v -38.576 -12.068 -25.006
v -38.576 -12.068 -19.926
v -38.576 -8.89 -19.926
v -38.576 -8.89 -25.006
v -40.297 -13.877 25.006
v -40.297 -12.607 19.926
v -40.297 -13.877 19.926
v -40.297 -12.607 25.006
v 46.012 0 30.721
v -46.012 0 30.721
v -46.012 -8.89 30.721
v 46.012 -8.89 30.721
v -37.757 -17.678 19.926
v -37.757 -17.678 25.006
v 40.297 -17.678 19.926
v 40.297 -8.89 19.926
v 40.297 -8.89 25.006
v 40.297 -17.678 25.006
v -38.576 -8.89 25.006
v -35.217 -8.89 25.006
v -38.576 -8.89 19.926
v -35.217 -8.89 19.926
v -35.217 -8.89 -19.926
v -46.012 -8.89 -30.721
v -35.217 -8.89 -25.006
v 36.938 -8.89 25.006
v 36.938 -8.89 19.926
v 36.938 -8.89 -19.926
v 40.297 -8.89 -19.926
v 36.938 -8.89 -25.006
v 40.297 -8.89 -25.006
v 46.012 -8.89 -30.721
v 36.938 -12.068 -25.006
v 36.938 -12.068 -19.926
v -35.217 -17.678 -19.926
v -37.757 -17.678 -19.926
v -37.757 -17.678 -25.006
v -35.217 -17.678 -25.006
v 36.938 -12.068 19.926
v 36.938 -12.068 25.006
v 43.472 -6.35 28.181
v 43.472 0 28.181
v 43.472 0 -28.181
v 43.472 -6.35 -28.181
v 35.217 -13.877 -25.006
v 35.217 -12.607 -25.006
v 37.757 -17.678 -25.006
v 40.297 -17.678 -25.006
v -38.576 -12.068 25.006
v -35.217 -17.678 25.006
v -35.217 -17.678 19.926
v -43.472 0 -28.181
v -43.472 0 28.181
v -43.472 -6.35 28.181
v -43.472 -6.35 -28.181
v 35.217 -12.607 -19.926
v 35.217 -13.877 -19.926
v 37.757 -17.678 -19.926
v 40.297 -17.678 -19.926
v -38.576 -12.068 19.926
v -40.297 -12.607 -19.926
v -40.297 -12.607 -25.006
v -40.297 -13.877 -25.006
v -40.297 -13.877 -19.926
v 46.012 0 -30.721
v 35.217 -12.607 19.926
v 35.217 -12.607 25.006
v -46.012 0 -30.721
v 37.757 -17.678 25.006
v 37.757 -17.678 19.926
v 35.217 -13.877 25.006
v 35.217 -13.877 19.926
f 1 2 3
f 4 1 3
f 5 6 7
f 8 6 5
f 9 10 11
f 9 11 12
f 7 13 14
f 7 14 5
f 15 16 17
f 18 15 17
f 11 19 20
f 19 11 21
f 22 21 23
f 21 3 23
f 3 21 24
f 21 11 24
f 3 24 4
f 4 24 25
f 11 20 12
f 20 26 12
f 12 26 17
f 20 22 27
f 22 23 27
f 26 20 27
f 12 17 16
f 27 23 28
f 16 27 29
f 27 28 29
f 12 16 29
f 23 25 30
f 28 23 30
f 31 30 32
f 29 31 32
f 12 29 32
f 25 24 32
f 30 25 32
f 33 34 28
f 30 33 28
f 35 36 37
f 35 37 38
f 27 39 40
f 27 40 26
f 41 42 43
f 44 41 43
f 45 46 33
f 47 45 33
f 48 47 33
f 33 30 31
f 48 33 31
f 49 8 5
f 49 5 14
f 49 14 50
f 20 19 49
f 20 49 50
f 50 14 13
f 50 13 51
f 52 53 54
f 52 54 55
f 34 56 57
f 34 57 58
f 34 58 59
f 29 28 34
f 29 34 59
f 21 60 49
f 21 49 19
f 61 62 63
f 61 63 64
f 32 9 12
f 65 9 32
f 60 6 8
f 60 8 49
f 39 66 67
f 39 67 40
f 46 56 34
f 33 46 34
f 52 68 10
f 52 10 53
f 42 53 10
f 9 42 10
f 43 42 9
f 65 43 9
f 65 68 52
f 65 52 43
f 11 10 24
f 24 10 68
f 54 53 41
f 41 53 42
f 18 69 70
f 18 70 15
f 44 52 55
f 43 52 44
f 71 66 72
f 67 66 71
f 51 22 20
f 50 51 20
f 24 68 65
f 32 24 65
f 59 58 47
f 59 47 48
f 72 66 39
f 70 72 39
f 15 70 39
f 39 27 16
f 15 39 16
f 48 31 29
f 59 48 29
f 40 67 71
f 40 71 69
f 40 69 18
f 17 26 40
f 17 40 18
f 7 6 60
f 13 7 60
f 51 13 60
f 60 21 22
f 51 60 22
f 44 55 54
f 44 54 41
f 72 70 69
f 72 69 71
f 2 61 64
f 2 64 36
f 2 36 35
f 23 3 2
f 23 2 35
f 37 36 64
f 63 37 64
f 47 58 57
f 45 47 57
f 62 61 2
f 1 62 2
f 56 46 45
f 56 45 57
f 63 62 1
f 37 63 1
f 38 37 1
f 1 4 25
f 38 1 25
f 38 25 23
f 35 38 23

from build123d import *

# Parameters (mm, degrees)
SKETCH1_W           = 92.0242
SKETCH1_H           = 61.4426
BOSS_EXTRUDE1_DEPTH = 8.89
SKETCH2_W           = 86.9442
SKETCH2_H           = 56.3626
CUT_EXTRUDE4_DEPTH  = 6.35
SKETCH3_W           = 5.08
SKETCH3_H           = 5.08
BOSS_EXTRUDE2_DEPTH = 8.7884
CUT_EXTRUDE5_DEPTH  = 5.08


with BuildPart() as part:
    # Sketch1 → Boss-Extrude1 (new body)
    with BuildSketch(Plane(origin=(0, 0, 0), x_dir=(1, 0, 0), z_dir=(0, 1, 0))):
        Rectangle(SKETCH1_W, SKETCH1_H)
    extrude(amount=-BOSS_EXTRUDE1_DEPTH)

    # Sketch2 → Cut-Extrude4 (cut)
    with BuildSketch(Plane(origin=(0, 0, 0), x_dir=(1, 0, 0), z_dir=(0, 1, 0))):
        Rectangle(SKETCH2_W, SKETCH2_H)
    extrude(amount=-CUT_EXTRUDE4_DEPTH, mode=Mode.SUBTRACT)

    # Sketch3 → Boss-Extrude2 (add)
    with BuildSketch(Plane.XZ.offset(8.89)):
        with Locations((37.7571, -22.4663)):
            Rectangle(SKETCH3_W, SKETCH3_H)
        with Locations((-37.7571, 22.4663)):
            Rectangle(SKETCH3_W, SKETCH3_H)
        with Locations((-37.7571, -22.4663)):
            Rectangle(SKETCH3_W, SKETCH3_H)
        with Locations((37.7571, 22.4663)):
            Rectangle(SKETCH3_W, SKETCH3_H)
    extrude(amount=BOSS_EXTRUDE2_DEPTH)

    # Sketch4 → Cut-Extrude5 (cut)
    with BuildSketch(Plane.XY.offset(25.0063)):
        Polygon((35.2171, -13.876876095), (35.2171, -17.6784), (37.7571, -17.6784), align=None)
        Polygon((35.2171, -8.89), (35.2171, -12.606876095), (36.938174553, -12.068216701), (36.938174553, -8.89), align=None)
        Polygon((-37.7571, -17.6784), (-40.2971, -13.876876095), (-40.2971, -17.6784), align=None)
        Polygon((-38.576025447, -12.068216701), (-38.576025447, -8.89), (-40.2971, -8.89), (-40.2971, -12.606876095), align=None)
    cut_extrude5 = extrude(amount=-CUT_EXTRUDE5_DEPTH, mode=Mode.SUBTRACT)

    # Mirror1: Cut-Extrude5 across plane
    add(cut_extrude5.mirror(Plane.XY), mode=Mode.SUBTRACT)


solid = part.part
